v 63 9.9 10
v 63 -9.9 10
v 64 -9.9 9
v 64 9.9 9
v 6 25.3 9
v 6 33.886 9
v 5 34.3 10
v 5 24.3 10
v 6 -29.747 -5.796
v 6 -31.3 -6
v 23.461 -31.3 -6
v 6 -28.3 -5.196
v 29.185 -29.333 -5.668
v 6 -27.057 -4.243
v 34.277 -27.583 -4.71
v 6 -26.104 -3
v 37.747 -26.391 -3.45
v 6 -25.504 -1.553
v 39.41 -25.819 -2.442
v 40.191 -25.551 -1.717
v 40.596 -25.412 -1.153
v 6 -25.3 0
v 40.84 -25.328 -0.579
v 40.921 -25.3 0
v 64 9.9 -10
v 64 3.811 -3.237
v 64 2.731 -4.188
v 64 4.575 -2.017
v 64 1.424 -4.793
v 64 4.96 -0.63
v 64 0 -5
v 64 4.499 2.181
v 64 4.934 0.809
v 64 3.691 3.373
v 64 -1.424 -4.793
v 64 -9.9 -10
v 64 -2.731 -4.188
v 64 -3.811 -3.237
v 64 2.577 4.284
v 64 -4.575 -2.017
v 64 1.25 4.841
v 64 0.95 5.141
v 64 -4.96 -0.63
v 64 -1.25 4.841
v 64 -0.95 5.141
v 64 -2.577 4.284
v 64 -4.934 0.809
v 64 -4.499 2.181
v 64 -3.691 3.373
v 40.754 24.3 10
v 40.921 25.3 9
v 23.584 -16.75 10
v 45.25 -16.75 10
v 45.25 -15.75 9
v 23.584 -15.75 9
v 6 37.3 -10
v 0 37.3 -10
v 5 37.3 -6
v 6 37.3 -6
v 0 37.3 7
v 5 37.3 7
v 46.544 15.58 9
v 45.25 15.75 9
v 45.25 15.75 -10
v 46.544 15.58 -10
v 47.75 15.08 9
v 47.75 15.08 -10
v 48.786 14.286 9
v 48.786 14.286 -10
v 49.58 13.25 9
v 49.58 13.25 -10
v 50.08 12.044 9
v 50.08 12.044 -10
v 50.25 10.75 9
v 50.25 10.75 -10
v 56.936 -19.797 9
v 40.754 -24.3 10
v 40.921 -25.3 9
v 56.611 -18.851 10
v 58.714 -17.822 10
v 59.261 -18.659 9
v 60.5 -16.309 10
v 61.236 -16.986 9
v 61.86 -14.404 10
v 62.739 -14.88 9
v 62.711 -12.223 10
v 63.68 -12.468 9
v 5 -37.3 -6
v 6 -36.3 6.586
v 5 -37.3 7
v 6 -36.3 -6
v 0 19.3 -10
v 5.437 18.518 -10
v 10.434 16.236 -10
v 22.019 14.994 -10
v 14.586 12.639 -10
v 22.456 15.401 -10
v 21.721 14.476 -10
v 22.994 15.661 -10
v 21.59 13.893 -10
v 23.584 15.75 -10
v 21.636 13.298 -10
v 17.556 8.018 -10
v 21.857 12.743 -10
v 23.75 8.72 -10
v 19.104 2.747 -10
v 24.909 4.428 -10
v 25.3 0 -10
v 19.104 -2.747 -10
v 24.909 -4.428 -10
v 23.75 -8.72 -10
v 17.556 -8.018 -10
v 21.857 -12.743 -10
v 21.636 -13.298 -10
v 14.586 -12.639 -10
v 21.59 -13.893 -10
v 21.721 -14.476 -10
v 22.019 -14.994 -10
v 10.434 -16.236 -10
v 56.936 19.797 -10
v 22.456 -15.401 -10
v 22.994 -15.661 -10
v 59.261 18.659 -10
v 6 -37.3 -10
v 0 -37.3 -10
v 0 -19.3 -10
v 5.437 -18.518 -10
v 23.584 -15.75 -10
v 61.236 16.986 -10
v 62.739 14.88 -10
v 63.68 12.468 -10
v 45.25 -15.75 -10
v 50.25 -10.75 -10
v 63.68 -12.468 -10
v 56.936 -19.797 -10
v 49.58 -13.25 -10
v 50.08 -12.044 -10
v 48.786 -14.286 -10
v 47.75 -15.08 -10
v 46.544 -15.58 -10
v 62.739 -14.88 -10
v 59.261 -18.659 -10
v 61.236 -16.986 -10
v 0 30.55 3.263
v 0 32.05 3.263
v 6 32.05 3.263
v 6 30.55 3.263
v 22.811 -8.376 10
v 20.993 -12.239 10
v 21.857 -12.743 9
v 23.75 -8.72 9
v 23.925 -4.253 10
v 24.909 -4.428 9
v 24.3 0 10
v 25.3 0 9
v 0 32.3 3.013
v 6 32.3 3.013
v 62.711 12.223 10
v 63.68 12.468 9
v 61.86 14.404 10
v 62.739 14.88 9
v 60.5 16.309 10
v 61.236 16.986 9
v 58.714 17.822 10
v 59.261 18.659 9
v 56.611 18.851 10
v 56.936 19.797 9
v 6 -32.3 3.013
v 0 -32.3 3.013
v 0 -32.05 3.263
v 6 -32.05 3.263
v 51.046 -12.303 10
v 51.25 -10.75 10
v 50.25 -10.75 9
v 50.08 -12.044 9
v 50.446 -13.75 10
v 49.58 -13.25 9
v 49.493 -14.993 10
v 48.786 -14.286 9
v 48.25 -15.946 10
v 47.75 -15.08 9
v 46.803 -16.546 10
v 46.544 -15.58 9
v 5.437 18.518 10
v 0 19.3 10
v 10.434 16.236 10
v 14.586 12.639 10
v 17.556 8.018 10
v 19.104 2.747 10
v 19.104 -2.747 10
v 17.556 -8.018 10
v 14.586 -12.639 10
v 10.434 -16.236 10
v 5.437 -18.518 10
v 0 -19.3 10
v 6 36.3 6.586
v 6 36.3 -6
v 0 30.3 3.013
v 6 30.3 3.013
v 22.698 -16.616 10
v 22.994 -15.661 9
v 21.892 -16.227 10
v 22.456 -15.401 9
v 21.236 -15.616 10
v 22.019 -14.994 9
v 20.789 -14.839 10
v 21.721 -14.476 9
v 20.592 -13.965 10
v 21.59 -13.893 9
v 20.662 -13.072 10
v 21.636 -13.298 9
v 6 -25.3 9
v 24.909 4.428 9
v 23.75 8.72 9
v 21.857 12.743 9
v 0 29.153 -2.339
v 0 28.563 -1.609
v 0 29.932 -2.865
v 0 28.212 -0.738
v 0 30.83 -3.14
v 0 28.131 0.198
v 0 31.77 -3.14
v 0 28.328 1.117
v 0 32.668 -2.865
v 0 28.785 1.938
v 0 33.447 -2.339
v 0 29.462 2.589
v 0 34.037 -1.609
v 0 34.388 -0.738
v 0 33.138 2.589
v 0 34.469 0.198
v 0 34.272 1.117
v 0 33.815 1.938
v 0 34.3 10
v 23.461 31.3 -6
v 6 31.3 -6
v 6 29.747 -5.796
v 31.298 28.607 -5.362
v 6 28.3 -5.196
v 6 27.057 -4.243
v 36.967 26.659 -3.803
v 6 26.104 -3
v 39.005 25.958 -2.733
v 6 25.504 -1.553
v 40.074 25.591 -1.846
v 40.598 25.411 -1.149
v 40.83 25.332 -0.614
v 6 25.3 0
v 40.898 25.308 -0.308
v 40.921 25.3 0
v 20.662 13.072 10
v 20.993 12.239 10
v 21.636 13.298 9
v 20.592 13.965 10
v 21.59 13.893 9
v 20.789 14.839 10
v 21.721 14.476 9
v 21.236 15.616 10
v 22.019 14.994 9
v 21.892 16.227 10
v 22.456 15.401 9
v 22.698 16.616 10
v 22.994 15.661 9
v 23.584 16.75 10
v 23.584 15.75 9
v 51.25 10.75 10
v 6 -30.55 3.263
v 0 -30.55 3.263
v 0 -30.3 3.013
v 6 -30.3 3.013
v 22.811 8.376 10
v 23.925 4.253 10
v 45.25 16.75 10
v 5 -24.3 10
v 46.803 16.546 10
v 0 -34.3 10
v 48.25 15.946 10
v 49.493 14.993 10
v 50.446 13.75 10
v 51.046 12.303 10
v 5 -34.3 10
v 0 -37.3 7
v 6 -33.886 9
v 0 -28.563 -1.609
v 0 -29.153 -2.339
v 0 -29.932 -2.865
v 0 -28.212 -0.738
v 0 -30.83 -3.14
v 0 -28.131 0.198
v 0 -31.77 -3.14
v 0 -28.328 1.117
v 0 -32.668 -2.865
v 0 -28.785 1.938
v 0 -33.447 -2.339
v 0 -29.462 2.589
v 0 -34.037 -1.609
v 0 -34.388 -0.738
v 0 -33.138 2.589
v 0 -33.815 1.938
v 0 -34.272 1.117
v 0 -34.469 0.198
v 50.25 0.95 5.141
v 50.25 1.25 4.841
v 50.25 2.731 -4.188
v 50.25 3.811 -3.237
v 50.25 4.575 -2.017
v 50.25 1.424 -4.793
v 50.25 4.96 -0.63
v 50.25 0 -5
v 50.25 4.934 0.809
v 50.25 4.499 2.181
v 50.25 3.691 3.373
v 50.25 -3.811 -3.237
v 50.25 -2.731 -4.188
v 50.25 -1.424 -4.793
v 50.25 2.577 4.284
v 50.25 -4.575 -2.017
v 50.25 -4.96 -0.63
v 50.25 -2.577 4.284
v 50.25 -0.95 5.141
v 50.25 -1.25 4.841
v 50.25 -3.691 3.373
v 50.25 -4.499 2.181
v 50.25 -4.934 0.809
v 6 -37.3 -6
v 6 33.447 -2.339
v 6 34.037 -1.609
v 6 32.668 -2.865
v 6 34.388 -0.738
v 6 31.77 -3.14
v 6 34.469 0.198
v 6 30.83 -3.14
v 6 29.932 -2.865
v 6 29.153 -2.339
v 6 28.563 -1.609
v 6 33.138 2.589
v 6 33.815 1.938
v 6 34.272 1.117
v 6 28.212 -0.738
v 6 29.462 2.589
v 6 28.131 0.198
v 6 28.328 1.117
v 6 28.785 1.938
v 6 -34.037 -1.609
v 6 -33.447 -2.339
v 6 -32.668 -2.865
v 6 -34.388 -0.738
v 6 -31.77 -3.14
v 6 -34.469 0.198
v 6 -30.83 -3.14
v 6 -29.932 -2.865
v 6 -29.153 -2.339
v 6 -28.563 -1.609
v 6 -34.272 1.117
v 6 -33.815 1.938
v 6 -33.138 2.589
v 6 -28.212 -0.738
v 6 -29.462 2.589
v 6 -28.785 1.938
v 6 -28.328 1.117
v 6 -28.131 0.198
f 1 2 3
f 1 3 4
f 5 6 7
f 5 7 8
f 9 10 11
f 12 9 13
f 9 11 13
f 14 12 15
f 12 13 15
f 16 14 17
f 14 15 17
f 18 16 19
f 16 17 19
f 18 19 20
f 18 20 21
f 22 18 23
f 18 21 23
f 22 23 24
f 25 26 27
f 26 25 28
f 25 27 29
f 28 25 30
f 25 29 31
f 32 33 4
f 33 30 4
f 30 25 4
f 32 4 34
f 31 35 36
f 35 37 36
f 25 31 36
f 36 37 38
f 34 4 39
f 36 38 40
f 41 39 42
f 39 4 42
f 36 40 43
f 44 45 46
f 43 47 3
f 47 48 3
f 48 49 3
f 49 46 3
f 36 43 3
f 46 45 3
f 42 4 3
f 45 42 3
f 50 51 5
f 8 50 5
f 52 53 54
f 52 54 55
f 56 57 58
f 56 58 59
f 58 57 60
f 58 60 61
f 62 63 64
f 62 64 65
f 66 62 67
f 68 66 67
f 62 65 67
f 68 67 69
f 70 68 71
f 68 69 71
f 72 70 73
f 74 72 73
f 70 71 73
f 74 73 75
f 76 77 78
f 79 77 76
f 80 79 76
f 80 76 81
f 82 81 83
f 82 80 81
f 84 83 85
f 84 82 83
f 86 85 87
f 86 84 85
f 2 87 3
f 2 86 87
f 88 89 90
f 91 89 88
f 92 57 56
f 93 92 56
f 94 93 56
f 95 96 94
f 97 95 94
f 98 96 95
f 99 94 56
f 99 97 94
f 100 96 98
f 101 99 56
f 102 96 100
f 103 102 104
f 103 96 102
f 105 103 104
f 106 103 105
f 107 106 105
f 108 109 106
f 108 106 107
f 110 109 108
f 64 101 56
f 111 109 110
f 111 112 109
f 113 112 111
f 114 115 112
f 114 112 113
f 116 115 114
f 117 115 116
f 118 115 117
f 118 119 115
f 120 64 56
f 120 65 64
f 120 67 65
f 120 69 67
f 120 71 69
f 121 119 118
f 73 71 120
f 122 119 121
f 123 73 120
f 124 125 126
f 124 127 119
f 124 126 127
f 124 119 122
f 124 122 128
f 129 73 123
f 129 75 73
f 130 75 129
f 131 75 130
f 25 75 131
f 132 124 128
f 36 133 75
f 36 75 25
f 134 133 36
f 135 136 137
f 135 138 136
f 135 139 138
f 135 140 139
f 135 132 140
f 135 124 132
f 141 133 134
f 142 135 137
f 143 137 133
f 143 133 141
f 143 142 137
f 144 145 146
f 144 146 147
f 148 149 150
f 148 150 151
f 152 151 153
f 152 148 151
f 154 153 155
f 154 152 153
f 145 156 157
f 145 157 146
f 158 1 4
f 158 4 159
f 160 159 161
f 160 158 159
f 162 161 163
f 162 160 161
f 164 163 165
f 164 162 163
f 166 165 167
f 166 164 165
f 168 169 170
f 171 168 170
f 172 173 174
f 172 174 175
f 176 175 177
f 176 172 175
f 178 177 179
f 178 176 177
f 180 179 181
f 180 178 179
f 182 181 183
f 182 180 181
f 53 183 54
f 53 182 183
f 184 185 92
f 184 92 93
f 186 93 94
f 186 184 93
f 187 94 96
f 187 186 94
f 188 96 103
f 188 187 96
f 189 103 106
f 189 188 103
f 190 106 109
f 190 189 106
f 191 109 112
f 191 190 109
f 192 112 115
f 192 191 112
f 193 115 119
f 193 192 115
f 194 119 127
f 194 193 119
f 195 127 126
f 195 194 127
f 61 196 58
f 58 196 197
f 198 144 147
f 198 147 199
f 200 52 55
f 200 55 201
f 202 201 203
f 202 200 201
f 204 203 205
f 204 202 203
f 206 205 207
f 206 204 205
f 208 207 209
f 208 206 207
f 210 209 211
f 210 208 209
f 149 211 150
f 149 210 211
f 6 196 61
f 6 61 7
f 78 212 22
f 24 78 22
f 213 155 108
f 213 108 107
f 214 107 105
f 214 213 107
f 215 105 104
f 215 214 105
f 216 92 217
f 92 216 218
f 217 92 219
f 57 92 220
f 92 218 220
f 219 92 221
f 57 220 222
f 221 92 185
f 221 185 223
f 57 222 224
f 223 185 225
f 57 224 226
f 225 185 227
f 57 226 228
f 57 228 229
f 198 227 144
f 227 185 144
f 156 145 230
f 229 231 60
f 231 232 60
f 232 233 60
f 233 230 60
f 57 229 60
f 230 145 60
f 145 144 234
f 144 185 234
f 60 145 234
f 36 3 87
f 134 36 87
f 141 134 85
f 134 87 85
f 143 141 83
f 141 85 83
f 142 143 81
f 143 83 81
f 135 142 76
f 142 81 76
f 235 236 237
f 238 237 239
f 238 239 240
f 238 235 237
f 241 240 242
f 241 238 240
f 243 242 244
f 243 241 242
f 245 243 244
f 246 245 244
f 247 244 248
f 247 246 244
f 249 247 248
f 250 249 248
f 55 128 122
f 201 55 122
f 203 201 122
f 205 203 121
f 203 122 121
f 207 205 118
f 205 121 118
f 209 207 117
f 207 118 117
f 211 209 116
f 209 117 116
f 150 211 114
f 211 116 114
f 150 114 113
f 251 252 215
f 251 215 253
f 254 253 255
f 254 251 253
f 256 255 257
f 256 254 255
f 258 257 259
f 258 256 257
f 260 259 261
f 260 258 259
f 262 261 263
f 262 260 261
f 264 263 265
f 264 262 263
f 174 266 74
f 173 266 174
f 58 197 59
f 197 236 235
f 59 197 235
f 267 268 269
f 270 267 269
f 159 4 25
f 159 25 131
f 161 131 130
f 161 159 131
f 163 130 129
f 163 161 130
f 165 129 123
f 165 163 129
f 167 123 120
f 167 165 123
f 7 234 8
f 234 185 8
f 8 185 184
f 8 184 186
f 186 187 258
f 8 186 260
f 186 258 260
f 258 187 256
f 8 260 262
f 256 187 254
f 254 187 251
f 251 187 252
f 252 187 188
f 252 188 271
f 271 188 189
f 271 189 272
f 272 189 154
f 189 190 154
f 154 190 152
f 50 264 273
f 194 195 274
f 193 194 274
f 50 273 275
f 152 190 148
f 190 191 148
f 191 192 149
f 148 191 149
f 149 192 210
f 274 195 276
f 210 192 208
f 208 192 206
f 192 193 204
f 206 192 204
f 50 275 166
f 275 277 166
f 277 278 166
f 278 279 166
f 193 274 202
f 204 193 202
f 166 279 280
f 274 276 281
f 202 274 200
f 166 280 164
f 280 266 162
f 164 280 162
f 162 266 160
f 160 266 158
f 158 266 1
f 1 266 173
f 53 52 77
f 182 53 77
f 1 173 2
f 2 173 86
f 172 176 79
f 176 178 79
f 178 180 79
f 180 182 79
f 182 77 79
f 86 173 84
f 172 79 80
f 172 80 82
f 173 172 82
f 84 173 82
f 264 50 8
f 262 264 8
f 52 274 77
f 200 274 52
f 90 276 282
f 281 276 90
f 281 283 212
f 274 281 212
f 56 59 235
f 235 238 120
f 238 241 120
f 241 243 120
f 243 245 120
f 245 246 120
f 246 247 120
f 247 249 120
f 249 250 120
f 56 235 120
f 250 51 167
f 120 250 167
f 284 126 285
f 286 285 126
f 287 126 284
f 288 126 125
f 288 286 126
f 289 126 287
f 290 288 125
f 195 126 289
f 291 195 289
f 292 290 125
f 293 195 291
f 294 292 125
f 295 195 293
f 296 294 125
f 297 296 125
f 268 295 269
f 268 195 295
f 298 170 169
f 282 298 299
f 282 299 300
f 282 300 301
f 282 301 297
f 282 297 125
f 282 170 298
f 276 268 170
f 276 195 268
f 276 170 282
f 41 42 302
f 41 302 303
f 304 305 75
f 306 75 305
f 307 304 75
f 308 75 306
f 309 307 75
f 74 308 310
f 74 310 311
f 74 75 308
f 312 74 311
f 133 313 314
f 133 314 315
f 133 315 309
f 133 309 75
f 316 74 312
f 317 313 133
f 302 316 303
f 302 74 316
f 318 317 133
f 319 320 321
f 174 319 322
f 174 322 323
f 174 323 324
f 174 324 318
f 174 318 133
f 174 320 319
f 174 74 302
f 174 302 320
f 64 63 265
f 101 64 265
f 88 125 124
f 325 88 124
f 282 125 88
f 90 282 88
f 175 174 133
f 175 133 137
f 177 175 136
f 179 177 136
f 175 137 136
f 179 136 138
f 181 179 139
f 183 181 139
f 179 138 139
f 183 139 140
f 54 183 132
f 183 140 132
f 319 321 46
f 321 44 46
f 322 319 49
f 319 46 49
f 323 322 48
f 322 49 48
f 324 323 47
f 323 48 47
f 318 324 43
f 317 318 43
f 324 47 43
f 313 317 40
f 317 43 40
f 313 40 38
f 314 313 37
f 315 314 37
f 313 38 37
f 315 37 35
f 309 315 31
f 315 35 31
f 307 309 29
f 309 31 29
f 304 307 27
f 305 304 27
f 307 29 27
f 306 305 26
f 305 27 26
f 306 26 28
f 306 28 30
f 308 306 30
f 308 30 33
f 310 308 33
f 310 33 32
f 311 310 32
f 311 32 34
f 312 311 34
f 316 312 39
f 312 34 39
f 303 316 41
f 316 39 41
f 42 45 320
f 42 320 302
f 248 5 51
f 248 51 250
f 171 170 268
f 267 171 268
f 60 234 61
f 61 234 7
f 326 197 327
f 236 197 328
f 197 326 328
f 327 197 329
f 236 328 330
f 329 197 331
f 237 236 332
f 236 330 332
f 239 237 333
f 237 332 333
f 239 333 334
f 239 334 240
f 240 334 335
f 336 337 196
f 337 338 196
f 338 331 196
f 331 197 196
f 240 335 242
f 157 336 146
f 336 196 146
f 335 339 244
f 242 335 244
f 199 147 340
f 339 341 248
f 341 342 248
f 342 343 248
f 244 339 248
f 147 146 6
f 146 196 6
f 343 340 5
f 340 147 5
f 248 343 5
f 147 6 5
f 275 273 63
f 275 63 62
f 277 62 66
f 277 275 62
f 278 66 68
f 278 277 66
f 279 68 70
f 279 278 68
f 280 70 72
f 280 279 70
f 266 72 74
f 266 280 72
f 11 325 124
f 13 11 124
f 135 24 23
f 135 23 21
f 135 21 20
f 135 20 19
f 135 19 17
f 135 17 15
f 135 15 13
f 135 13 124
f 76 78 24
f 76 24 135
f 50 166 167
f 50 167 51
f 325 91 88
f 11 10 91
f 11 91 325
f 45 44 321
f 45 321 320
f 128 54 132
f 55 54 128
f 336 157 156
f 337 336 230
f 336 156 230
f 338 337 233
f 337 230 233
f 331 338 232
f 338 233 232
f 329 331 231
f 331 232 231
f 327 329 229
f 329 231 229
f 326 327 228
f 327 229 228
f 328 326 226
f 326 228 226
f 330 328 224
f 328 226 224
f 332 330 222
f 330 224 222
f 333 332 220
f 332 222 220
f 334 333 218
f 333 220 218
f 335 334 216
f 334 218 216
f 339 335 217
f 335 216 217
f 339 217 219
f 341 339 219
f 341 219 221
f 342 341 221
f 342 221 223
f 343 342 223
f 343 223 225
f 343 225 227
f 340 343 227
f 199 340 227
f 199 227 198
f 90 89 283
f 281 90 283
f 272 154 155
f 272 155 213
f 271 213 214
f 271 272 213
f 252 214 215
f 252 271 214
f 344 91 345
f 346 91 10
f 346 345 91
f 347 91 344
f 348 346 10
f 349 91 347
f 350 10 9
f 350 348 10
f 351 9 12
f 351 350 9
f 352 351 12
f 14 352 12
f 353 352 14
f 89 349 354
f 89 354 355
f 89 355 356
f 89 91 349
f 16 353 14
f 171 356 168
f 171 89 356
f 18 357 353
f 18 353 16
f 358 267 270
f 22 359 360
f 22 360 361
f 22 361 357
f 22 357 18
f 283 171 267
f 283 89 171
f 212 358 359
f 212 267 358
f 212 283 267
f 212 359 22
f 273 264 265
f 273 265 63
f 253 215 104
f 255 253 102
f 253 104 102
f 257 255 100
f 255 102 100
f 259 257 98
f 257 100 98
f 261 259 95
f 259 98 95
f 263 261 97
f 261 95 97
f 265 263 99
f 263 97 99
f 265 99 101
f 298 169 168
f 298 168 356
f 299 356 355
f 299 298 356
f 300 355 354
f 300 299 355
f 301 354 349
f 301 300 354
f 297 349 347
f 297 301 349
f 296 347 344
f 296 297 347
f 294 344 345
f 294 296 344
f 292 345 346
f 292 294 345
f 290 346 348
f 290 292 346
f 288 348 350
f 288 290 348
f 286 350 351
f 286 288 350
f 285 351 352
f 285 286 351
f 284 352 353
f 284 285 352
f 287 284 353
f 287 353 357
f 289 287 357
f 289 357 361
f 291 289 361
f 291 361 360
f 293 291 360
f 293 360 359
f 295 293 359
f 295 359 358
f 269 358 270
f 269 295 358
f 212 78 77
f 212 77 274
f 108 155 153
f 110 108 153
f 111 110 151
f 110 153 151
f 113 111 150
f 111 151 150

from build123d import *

# Parameters (mm, degrees)
PAD004_DEPTH    = 10
PAD005_DEPTH    = 20
PAD006_DEPTH    = 20
FILLET_R        = 5
SKETCH017_R     = 5
POCKET008_DEPTH = 13.75
POCKET009_DEPTH = 13.75
SKETCH019_R     = 3.175
POCKET010_DEPTH = 264.6116677124
POCKET011_DEPTH = 264.6116677124
POCKET012_DEPTH = 58
CHAMFER003_SIZE = 3
FILLET001_R     = 2
CHAMFER004_SIZE = 1


with BuildPart() as part:
    # Sketch014 → Pad004 (new body, symmetric)
    with BuildSketch(Plane.XY):
        with BuildLine():
            ThreePointArc((19.3, 0), (13.6471608769, 13.6471608769), (0, 19.3))
            Line((0, 19.3), (0, 25.3))
            ThreePointArc((25.3, 0), (17.889801564, 17.889801564), (0, 25.3))
            Line((19.3, 0), (25.3, 0))
        make_face()
    pad004 = extrude(amount=PAD004_DEPTH, both=True)

    # Mirrored007: Pad004 across Sketch014 H_Axis
    add(pad004.mirror(Plane.ZX))

    # Sketch015 (on Face4 of Mirrored007) → Pad005 (join)
    with BuildSketch(Plane.XY.offset(10)):
        with BuildLine():
            Line((0, 25.3), (0, 37.3))
            Line((0, 37.3), (6, 37.3))
            Line((6, 37.3), (6, 24.5782424107))
            ThreePointArc((6, 24.5782424107), (3.021627625, 25.1189125261), (0, 25.3))
        make_face()
    pad005 = extrude(amount=-PAD005_DEPTH)

    # Mirrored008: Pad005 across Sketch015 H_Axis
    add(pad005.mirror(Plane(origin=(0, 0, 10), x_dir=(0, 0, 1), z_dir=(0, 1, 0))))

    # Sketch016 (on Face8 of Mirrored008) → Pad006 (join)
    with BuildSketch(Plane.XY.offset(10)):
        with BuildLine():
            Line((50.25, 0), (64, 0))
            Line((64, 0), (64, 9.9))
            ThreePointArc((64, 9.9), (62.0528467529, 15.9796404149), (56.935983439, 19.7968570932))
            Line((6, 37.3), (56.935983439, 19.7968570932))
            Line((6, 37.3), (6, 24.5782424107))
            ThreePointArc((19.7996843409, 15.75), (13.6341627553, 21.3119592239), (6, 24.5782424107))
            Line((50.25, 15.75), (19.7996843409, 15.75))
            Line((50.25, 0), (50.25, 15.75))
        make_face()
    pad006 = extrude(amount=-PAD006_DEPTH)

    # Mirrored009: Pad006 across Sketch016 H_Axis
    add(pad006.mirror(Plane(origin=(0, 0, 10), x_dir=(0, 0, 1), z_dir=(0, 1, 0))))

    # Fillet
    fillet_edges = [part.edges().sort_by_distance(p)[0] for p in [
        (50.25, 15.75, 0),
        (50.25, -15.75, 0),
    ]]
    fillet(fillet_edges, radius=FILLET_R)

    # Sketch017 (on Face13 of Fillet) → Pocket008 (cut)
    with BuildSketch(Plane.YZ.offset(64)):
        Circle(SKETCH017_R)
    extrude(amount=-POCKET008_DEPTH, mode=Mode.SUBTRACT)

    # Sketch018 (on Face13 of Pocket008) → Pocket009 (cut)
    with BuildSketch(Plane.YZ.offset(64)):
        Polygon((-1.25, 4.8412291828), (-0.95, 5.1412291828), (0.95, 5.1412291828), (1.25, 4.8412291828), align=None)
    extrude(amount=-POCKET009_DEPTH, mode=Mode.SUBTRACT)

    # Sketch019 (on Face9 of Pocket009) → Pocket010 (cut, through all)
    with BuildSketch(Plane(origin=(0, 0, 0), x_dir=(0, -1, 0), z_dir=(-1, 0, 0))):
        with Locations((-31.3, 0)):
            Circle(SKETCH019_R)
    pocket010 = extrude(amount=-POCKET010_DEPTH, mode=Mode.SUBTRACT)

    # Mirrored010: Pocket010 across Sketch019 V_Axis
    add(pocket010.mirror(Plane(origin=(0, 0, 0), x_dir=(-1, 0, 0), z_dir=(0, -1, 0))), mode=Mode.SUBTRACT)

    # Sketch020 (on Face17 of Mirrored010) → Pocket011 (cut, through all)
    with BuildSketch(Plane(origin=(0, 0, 0), x_dir=(0, -1, 0), z_dir=(-1, 0, 0))):
        Polygon((-32.3, 3.0134075396), (-32.05, 3.2634075396), (-30.55, 3.2634075396), (-30.3, 3.0134075396), align=None)
    pocket011 = extrude(amount=-POCKET011_DEPTH, mode=Mode.SUBTRACT)

    # Mirrored011: Pocket011 across Sketch020 V_Axis
    add(pocket011.mirror(Plane(origin=(0, 0, 0), x_dir=(-1, 0, 0), z_dir=(0, -1, 0))), mode=Mode.SUBTRACT)

    # Sketch021 (on Face13 of Mirrored011) → Pocket012 (cut)
    with BuildSketch(Plane.YZ.offset(64)):
        with BuildLine():
            ThreePointArc((-31.3, -6), (-27.0573593129, -4.2426406871), (-25.3, 0))
            Line((-25.3, 10), (-25.3, 0))
            Line((-37.3, 10), (-25.3, 10))
            Line((-37.3, -6), (-37.3, 10))
            Line((-31.3, -6), (-37.3, -6))
        make_face()
    pocket012 = extrude(amount=-POCKET012_DEPTH, mode=Mode.SUBTRACT)

    # Mirrored012: Pocket012 across Sketch021 V_Axis
    add(pocket012.mirror(Plane(origin=(64, 0, 0), x_dir=(1, 0, 0), z_dir=(0, 1, 0))), mode=Mode.SUBTRACT)

    # Chamfer003
    chamfer003_edges = [part.edges().sort_by_distance(p)[0] for p in [
        (3, -37.3, 10),
        (3, 37.3, 10),
    ]]
    chamfer(chamfer003_edges, length=CHAMFER003_SIZE)

    # Fillet001
    fillet001_edges = [part.edges().sort_by_distance(p)[0] for p in [
        (19.799684, -15.75, 0),
        (19.799684, 15.75, 0),
    ]]
    fillet(fillet001_edges, radius=FILLET001_R)

    # Chamfer004
    chamfer004_edges = [part.edges().sort_by_distance(p)[0] for p in [
        (6, -37.3, 0.5),
        (6, -35.8, 8.5),
        (6, -29.8, 10),
        (23.46063, -25.3, 10),
        (48.928622, -22.548429, 10),
        (62.052847, -15.97964, 10),
        (64, 0, 10),
        (62.052847, 15.97964, 10),
        (48.928622, 22.548429, 10),
        (23.46063, 25.3, 10),
        (6, 29.8, 10),
        (6, 35.8, 8.5),
        (6, 37.3, 0.5),
        (21.850311, -14.74633, 10),
        (24.424003, -6.599853, 10),
        (24.424003, 6.599853, 10),
        (21.850311, 14.74633, 10),
        (34.417238, 15.75, 10),
        (48.785534, 14.285534, 10),
        (50.25, 0, 10),
        (48.785534, -14.285534, 10),
        (34.417238, -15.75, 10),
    ]]
    chamfer(chamfer004_edges, length=CHAMFER004_SIZE)


solid = part.part
